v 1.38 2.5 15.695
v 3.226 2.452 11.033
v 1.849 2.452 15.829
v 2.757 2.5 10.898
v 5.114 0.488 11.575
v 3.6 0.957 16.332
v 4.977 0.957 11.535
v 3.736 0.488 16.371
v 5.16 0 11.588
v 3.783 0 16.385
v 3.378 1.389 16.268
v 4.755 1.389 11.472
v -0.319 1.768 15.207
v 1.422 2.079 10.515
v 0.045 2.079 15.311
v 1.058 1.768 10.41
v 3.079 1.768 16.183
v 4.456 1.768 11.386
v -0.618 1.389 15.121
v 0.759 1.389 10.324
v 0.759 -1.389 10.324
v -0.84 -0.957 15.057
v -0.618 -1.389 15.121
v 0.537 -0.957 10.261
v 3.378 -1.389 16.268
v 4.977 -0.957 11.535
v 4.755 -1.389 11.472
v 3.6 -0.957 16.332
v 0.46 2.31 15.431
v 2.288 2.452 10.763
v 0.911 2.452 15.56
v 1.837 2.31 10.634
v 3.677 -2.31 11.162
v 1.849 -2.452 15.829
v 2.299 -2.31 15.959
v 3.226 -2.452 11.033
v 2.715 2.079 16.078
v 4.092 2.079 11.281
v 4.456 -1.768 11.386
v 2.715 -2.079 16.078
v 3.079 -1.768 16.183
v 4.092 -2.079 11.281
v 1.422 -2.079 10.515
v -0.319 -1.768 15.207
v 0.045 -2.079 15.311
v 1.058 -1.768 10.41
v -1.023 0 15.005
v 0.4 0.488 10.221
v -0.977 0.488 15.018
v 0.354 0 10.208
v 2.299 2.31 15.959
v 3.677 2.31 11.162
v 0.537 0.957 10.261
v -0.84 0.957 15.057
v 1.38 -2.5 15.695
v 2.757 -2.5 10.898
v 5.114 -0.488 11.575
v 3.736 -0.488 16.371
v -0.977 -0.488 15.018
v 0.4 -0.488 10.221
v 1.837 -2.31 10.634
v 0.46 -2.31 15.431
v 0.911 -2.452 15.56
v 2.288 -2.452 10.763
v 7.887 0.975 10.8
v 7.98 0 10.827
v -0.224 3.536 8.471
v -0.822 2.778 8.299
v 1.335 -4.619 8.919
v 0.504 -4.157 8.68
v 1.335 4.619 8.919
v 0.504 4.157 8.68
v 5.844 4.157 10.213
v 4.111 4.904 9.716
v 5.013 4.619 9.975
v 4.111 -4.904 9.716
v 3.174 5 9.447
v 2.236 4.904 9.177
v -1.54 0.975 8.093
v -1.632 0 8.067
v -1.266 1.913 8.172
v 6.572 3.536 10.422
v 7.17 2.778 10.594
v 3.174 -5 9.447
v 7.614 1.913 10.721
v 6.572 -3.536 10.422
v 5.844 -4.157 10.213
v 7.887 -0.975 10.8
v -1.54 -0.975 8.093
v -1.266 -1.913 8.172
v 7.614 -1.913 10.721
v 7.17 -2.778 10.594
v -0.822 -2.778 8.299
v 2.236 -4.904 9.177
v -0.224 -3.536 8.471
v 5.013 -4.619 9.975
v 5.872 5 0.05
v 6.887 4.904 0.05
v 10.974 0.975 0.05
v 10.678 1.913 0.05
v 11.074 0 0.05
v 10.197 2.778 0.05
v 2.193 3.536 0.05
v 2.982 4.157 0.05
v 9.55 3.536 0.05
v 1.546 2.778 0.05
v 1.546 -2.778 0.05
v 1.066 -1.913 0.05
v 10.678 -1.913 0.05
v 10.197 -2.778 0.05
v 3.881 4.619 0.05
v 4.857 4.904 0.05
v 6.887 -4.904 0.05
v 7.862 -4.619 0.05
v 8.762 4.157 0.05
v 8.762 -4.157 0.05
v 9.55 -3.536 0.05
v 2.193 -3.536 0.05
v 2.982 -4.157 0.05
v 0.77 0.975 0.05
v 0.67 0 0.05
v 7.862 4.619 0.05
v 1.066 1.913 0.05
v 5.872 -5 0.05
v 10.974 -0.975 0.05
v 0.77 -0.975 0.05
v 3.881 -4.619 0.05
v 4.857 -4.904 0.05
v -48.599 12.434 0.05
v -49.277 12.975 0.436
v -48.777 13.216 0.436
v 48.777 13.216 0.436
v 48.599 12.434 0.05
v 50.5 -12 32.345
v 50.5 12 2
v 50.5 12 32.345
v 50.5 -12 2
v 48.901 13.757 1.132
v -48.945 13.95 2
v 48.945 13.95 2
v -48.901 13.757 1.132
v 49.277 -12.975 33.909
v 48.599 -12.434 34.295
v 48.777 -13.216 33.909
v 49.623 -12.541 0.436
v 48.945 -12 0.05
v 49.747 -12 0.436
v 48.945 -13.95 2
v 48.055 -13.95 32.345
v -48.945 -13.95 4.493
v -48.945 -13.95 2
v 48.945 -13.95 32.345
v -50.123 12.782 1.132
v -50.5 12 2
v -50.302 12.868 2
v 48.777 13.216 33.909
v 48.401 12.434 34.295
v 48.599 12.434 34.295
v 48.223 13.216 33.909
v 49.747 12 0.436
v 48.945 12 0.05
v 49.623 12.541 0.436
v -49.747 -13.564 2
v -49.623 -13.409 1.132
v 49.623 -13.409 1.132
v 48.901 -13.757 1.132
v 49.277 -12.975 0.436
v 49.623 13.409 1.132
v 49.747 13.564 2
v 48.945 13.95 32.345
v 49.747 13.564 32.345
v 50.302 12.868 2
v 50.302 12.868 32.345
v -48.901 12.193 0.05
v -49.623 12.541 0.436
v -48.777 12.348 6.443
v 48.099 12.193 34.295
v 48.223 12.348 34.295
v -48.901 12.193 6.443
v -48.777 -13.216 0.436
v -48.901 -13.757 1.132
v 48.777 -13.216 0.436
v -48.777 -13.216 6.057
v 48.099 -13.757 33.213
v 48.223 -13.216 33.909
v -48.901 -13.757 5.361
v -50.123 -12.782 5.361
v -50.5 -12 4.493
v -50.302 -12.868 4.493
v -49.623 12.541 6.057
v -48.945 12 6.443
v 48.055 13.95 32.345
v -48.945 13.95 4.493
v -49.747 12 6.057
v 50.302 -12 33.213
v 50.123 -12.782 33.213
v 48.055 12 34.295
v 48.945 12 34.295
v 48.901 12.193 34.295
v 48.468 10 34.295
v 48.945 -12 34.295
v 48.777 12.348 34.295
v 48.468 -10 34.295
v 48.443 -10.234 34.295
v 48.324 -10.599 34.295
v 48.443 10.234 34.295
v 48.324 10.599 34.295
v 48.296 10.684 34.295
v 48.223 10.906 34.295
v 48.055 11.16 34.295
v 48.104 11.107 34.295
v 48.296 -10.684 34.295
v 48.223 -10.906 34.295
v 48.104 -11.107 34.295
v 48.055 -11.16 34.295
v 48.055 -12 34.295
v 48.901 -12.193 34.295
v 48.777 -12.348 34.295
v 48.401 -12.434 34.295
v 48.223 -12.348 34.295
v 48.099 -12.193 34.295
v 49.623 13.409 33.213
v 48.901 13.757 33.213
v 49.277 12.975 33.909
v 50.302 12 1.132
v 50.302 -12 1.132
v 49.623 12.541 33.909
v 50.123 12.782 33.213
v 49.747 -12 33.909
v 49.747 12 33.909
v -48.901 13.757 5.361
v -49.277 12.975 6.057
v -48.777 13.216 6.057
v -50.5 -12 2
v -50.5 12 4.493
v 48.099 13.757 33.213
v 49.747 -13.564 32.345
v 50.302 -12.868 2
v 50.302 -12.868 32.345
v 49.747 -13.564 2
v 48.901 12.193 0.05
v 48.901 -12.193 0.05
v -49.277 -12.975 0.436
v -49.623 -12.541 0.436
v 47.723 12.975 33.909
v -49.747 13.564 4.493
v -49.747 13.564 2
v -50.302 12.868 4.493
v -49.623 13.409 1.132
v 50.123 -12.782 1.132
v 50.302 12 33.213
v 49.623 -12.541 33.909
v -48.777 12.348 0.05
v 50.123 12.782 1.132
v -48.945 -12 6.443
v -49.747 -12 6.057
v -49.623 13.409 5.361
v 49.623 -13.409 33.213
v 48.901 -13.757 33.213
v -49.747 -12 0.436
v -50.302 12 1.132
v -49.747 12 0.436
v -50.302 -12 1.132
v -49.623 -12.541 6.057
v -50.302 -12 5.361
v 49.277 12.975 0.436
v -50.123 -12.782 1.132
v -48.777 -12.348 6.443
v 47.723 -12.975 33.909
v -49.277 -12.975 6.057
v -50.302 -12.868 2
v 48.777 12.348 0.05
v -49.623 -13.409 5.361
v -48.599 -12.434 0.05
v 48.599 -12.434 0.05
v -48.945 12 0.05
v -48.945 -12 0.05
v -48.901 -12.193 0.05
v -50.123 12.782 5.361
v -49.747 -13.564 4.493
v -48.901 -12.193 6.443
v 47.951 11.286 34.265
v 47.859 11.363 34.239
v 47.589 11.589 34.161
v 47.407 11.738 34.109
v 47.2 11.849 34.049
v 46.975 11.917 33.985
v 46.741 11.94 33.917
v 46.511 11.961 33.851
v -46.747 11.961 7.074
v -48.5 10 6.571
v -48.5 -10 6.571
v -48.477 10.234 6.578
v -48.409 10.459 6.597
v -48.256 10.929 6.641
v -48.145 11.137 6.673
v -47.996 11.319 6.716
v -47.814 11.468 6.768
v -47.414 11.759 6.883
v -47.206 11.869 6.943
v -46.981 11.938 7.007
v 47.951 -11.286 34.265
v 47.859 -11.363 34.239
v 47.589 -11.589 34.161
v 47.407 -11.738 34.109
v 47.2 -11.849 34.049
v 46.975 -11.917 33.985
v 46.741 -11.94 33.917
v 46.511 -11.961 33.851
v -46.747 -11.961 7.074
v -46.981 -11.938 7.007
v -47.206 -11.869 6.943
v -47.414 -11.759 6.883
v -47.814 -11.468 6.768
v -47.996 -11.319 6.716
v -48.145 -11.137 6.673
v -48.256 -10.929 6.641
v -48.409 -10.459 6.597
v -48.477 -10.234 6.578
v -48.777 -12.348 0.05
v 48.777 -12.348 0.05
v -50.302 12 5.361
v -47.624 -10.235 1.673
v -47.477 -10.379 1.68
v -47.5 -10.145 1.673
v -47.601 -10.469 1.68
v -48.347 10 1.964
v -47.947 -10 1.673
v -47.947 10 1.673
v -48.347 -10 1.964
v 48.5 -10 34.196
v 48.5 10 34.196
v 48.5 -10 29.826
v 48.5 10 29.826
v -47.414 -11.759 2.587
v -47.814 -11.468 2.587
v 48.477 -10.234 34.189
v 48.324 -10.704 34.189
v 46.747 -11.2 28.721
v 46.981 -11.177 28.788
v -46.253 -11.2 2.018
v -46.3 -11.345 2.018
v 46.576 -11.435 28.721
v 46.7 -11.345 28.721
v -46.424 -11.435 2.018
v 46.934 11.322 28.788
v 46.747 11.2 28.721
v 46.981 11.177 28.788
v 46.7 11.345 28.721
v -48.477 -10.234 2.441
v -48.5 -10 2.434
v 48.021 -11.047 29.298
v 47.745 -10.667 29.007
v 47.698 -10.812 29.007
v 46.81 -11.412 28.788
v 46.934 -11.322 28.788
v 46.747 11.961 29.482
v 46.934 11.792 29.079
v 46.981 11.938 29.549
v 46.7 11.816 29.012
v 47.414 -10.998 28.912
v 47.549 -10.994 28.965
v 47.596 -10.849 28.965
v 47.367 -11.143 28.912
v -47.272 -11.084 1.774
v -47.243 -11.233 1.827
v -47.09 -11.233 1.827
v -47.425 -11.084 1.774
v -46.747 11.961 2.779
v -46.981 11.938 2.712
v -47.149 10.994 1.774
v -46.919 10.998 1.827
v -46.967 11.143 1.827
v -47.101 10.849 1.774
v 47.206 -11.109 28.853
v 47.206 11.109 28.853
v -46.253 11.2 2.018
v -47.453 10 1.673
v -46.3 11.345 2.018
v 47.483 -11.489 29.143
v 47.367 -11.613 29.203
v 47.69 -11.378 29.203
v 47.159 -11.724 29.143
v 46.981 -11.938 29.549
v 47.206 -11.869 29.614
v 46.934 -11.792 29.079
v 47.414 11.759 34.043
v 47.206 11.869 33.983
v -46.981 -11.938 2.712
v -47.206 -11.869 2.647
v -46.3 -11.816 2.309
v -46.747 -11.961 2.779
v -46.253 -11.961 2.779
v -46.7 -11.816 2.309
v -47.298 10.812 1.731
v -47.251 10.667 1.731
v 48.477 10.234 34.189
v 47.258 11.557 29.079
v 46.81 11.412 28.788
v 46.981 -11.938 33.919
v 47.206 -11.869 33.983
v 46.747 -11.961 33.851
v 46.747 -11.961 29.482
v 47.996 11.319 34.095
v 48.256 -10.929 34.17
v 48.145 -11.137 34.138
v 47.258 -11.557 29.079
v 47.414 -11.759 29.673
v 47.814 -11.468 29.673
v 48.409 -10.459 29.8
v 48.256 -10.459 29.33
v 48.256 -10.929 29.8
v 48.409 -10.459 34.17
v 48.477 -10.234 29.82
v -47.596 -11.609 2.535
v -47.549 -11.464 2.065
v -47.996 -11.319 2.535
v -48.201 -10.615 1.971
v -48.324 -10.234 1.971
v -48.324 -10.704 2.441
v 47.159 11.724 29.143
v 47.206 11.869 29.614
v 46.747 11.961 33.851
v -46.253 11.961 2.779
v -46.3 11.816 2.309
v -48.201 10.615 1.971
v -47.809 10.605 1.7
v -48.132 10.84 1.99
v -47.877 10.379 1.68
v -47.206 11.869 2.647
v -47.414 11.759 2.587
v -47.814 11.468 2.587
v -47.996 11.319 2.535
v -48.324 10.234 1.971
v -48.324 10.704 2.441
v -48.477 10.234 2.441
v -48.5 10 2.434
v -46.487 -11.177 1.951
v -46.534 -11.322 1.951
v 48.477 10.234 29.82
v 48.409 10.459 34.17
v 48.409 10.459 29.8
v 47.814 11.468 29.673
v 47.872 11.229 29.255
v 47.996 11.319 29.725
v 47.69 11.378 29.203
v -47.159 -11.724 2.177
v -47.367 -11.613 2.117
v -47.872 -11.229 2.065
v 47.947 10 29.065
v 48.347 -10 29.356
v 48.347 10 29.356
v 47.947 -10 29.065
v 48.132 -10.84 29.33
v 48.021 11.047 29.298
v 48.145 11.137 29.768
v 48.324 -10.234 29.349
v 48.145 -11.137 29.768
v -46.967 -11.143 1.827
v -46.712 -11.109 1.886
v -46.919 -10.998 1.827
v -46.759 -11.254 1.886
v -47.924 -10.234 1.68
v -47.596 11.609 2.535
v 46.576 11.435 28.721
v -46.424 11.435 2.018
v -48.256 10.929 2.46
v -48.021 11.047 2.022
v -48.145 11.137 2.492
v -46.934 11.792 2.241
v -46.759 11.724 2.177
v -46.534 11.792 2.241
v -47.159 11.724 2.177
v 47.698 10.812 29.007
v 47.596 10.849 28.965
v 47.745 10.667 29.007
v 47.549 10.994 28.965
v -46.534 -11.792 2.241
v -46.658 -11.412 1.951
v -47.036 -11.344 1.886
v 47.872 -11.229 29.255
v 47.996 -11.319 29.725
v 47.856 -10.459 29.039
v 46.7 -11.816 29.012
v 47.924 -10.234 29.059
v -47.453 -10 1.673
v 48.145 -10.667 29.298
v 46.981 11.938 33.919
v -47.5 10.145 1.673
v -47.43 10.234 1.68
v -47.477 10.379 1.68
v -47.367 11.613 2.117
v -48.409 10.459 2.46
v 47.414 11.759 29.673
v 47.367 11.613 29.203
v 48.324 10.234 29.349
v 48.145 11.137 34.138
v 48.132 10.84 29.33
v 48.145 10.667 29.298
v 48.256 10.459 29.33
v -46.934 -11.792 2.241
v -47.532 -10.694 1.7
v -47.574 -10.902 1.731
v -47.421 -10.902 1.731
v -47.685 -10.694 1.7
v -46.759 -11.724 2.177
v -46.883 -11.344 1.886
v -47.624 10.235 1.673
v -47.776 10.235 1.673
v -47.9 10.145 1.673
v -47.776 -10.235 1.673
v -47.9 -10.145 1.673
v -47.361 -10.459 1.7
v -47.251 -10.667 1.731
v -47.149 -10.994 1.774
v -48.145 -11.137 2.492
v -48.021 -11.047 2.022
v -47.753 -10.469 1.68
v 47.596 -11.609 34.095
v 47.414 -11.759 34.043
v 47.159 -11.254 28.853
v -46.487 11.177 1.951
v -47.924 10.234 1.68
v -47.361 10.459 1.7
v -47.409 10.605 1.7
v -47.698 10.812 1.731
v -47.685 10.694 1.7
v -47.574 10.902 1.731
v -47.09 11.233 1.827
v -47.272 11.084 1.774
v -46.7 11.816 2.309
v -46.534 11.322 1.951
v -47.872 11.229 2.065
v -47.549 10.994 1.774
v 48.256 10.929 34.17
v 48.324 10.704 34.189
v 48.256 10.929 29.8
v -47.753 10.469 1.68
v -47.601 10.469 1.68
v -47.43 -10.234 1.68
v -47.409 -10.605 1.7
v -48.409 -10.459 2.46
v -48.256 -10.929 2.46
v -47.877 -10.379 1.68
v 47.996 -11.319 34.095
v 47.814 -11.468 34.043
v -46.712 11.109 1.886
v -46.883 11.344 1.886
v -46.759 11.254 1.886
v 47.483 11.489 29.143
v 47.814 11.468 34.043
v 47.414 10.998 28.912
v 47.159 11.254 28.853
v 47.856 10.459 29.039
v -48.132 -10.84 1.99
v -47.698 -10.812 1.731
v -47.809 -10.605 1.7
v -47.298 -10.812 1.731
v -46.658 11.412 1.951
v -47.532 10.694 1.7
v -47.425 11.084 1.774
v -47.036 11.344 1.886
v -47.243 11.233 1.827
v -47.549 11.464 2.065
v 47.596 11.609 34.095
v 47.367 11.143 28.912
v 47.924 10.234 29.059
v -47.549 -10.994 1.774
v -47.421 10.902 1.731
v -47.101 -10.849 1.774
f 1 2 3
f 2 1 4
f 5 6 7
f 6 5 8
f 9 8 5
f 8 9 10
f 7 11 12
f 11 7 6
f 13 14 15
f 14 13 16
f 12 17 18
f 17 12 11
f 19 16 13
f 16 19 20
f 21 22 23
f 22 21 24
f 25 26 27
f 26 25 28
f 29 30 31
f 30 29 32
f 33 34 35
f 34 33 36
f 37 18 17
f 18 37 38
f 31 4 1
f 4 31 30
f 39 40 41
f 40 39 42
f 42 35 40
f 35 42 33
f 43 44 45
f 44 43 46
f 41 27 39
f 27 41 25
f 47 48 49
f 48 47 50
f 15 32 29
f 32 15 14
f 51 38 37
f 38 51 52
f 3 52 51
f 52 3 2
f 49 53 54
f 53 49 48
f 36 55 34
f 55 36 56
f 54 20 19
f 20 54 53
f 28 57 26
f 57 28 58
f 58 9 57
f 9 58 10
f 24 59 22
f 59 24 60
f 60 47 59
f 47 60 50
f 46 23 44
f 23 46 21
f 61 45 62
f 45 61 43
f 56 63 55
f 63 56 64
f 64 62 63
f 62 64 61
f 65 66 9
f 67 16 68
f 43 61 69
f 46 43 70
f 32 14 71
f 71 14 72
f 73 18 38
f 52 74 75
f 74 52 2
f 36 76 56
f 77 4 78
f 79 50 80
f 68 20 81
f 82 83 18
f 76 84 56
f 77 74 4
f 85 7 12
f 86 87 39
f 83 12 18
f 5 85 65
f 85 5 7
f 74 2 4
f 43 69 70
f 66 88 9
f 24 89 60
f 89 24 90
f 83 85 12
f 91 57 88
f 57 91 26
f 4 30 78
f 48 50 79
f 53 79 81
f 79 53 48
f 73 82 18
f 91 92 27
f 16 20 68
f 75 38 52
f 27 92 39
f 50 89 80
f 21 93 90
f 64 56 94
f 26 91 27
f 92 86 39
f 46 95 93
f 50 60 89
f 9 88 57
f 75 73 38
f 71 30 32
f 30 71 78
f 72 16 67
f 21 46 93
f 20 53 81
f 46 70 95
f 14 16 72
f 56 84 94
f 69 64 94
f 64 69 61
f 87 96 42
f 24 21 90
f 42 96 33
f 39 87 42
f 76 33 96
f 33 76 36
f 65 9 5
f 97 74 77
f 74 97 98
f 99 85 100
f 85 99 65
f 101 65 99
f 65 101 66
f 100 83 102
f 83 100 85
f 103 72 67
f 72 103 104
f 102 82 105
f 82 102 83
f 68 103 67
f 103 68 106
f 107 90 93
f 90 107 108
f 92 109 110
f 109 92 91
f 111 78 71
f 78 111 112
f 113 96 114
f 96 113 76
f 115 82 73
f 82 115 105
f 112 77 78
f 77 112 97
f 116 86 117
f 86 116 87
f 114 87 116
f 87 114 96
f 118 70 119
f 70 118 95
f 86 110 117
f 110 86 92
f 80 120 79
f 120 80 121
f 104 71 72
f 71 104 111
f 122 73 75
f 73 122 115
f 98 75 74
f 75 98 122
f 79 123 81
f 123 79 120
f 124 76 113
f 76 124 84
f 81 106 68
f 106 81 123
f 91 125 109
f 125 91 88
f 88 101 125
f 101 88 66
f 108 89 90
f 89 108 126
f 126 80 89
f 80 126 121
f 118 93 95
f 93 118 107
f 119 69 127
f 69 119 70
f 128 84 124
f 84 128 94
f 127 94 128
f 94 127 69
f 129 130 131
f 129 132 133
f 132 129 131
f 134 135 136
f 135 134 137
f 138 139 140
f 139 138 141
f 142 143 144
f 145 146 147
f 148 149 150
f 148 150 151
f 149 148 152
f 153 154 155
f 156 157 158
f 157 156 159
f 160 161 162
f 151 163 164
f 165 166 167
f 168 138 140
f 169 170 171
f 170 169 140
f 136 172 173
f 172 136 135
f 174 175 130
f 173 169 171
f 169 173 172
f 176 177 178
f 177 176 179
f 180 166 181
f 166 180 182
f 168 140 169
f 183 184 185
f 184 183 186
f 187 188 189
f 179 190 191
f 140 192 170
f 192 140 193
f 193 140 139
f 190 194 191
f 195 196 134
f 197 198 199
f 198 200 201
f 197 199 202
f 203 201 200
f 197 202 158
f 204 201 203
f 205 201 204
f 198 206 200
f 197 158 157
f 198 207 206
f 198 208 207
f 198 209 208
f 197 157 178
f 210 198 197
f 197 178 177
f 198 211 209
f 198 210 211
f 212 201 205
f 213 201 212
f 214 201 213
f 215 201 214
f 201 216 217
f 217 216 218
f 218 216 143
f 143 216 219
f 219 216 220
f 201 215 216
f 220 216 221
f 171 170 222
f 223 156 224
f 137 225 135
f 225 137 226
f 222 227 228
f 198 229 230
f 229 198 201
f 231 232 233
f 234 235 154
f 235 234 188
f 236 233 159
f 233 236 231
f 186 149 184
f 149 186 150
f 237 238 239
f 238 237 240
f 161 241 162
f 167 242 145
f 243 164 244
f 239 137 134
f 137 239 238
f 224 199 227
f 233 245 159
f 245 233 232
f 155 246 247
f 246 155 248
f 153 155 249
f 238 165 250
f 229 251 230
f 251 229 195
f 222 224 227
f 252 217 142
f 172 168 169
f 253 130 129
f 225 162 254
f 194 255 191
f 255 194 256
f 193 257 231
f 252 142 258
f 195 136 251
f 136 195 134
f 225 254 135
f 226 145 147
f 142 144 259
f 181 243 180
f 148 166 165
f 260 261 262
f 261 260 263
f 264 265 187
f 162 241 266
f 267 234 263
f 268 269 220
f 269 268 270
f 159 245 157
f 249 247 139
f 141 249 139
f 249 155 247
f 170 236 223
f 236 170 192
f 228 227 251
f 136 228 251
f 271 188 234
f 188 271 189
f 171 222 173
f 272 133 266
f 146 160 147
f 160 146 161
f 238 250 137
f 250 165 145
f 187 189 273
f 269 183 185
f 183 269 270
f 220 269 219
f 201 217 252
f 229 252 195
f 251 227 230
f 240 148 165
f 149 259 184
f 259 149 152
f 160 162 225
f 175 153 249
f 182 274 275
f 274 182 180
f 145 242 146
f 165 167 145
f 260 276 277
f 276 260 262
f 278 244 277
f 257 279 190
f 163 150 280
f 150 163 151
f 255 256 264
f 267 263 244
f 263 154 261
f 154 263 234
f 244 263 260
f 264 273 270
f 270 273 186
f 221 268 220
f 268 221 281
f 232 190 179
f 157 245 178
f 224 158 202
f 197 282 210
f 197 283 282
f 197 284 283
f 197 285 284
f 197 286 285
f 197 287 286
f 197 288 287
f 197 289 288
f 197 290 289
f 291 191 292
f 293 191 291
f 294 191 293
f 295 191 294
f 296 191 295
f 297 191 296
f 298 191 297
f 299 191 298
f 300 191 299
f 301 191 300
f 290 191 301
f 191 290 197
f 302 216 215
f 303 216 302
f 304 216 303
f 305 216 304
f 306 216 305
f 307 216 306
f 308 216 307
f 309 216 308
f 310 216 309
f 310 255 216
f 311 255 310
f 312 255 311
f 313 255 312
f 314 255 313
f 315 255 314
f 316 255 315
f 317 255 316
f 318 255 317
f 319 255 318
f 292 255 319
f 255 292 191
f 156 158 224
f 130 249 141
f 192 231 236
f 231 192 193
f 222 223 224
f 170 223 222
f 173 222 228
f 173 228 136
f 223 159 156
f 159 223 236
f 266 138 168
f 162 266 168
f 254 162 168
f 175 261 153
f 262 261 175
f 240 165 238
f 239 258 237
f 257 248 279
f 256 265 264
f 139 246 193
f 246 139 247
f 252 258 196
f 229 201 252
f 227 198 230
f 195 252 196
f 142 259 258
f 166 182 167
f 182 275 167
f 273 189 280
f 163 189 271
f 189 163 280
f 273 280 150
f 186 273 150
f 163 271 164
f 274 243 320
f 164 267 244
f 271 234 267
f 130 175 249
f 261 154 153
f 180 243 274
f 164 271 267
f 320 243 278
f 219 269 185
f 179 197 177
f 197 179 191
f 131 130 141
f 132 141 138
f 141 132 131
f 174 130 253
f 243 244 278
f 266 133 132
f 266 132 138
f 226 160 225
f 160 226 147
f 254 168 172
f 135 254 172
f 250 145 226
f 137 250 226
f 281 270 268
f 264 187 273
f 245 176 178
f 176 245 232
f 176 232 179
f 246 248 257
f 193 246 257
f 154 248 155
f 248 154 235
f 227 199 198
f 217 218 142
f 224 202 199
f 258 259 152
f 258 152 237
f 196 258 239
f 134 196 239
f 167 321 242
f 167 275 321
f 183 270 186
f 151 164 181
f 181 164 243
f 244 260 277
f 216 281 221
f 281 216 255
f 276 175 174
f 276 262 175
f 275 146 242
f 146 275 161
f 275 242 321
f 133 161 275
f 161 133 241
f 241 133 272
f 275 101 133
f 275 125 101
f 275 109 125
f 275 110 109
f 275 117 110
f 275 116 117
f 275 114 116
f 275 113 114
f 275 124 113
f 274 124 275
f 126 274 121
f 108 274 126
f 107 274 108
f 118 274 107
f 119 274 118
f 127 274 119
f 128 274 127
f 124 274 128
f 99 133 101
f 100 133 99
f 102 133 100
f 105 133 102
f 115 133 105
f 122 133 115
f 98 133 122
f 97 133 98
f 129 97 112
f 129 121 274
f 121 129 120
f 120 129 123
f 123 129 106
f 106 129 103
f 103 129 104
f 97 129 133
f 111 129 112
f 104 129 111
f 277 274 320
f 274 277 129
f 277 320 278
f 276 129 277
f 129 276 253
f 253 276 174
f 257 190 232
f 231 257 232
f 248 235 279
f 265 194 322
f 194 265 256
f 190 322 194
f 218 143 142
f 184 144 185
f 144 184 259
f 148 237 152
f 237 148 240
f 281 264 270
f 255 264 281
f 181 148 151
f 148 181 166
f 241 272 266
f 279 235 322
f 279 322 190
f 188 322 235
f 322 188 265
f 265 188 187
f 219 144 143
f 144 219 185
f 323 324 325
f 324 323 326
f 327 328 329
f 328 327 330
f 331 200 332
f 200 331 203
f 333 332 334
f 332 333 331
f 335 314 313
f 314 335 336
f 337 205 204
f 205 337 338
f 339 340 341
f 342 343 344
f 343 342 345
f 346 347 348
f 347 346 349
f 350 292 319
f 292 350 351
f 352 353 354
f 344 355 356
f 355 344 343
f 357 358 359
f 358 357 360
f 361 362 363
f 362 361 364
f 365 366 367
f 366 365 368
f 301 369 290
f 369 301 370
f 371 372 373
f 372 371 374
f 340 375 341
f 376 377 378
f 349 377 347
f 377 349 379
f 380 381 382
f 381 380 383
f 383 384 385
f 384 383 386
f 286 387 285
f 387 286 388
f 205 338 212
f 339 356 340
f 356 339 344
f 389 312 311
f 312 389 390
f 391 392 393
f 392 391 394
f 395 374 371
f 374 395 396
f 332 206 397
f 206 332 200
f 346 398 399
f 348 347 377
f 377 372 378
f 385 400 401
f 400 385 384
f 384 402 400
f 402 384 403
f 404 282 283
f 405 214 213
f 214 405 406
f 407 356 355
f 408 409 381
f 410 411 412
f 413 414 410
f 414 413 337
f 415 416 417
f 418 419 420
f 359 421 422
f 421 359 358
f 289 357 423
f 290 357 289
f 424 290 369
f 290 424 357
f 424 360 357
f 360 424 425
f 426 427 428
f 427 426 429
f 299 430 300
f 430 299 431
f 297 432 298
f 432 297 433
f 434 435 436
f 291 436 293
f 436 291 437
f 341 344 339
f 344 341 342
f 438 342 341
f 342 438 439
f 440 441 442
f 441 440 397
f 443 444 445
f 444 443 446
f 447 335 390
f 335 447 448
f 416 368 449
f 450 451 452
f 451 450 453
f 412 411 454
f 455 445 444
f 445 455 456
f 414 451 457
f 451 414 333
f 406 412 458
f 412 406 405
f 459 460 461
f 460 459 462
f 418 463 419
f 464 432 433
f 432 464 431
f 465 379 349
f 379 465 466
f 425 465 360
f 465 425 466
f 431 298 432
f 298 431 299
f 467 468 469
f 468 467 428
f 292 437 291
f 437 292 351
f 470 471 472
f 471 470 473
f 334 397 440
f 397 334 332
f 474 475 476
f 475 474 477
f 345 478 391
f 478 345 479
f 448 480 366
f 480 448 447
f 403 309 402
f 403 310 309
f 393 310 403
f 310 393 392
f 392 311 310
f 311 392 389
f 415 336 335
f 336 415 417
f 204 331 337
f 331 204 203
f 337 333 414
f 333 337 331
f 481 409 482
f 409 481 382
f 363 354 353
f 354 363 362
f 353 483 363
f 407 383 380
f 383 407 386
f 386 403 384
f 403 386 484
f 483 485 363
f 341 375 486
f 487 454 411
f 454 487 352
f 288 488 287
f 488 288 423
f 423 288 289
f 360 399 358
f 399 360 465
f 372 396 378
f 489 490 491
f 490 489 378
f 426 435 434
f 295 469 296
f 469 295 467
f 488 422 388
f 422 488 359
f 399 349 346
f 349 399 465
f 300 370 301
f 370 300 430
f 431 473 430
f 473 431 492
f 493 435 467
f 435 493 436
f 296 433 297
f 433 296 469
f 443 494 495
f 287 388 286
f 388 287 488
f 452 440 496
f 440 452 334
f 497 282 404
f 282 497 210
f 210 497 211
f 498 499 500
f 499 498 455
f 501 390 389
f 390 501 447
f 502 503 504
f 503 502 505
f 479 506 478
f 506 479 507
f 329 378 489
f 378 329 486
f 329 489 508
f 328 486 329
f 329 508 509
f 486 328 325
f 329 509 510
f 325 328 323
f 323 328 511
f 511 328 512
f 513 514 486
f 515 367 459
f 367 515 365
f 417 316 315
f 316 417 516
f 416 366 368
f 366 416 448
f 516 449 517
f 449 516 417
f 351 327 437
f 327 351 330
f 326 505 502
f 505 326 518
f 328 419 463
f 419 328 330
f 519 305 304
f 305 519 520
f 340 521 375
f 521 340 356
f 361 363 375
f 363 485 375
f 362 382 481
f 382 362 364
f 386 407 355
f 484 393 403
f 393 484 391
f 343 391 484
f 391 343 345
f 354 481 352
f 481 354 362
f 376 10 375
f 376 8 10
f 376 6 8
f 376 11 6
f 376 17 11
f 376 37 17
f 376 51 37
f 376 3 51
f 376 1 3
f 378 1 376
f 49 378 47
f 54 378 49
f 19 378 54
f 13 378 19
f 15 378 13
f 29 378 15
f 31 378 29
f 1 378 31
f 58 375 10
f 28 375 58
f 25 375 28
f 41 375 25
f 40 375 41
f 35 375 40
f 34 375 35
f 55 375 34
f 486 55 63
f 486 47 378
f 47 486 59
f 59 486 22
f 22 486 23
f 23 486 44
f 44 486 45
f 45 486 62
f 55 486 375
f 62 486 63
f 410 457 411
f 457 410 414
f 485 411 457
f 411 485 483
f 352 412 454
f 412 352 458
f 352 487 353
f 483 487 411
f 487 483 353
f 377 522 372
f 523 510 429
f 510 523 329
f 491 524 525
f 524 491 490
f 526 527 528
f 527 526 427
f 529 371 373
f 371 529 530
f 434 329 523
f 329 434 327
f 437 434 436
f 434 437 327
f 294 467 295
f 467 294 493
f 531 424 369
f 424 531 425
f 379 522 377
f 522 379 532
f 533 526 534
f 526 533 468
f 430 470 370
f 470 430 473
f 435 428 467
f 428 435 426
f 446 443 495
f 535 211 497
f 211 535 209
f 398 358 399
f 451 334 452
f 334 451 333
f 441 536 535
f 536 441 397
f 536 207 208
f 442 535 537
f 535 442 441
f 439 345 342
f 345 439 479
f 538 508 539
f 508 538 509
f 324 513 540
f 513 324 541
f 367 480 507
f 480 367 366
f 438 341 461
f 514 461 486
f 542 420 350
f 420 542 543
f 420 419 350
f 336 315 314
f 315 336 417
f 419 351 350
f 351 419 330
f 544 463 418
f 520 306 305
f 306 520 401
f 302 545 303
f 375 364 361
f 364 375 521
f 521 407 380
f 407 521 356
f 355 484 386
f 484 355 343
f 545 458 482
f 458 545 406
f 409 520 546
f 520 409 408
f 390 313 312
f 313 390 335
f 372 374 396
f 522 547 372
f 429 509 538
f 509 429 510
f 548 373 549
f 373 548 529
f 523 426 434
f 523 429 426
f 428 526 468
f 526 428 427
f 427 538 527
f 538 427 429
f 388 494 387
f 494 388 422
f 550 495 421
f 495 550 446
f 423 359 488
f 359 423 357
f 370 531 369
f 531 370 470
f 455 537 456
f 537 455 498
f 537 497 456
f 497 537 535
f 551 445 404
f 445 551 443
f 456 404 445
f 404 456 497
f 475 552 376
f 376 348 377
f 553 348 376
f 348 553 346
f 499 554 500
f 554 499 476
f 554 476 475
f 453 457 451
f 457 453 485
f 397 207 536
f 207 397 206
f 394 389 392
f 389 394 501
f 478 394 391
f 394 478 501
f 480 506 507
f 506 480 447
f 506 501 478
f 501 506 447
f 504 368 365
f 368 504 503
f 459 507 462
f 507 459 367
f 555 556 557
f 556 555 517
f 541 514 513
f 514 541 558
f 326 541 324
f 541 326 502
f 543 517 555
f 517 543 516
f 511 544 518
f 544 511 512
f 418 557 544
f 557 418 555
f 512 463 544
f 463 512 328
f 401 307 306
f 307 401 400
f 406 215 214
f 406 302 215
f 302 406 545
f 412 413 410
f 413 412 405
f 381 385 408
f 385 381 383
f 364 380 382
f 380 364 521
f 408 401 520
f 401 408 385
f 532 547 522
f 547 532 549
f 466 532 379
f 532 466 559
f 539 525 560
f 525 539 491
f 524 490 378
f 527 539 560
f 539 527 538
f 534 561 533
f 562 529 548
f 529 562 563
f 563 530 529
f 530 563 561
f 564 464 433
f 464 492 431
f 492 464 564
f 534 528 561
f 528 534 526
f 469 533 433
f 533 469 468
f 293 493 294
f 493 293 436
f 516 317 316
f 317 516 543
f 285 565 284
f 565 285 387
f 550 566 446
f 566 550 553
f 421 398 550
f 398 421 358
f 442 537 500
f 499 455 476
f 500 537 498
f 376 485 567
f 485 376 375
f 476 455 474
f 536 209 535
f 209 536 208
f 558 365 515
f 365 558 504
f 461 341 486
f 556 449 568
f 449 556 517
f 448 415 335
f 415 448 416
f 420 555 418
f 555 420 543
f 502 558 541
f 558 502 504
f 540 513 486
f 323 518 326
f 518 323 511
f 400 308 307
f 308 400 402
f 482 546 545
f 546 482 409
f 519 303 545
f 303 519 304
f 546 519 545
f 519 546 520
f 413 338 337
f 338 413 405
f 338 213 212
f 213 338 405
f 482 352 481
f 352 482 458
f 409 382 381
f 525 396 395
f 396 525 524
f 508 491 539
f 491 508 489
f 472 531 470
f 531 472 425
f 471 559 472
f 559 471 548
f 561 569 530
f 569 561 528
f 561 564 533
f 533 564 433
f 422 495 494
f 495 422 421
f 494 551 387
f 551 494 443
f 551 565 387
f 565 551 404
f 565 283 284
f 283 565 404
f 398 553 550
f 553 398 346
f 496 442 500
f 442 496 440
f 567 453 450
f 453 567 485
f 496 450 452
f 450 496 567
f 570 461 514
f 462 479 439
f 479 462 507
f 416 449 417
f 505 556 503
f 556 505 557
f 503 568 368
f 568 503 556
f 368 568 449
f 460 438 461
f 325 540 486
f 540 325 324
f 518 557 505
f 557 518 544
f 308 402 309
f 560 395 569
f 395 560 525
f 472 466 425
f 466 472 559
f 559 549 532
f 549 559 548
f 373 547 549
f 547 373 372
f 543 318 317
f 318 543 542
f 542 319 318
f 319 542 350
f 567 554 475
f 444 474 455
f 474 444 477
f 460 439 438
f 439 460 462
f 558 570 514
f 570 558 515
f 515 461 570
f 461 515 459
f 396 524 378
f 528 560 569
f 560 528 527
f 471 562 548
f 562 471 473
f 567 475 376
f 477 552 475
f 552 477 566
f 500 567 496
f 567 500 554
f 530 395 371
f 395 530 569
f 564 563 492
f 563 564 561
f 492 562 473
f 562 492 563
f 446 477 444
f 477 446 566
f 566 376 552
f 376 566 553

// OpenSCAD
// =====================================================================
//  PIED BABY-FOOT MONNERET — Patin / Sabot de pied
//  Geometrie validee sur la PIECE REELLE (photos src/) :
//   - corps PLEIN, aretes exterieures arrondies (R2)
//   - CREUX de 5 mm dans le TOIT INCLINE, ⊥ a la face, borde de 2 mm
//   - collerette pleine de 3 mm autour du trou (au niveau du toit)
//   - trou Ø5 (moitie haute) + CONTRE-PERCAGE par le dessous :
//       Ø plus grand, profondeur = moitie de la piece, fond plat,
//       entree legerement conique. La vis entre par le dessous.
//  Repere : longueur = X, largeur = Y, hauteur = Z, dessous a Z = 0.
//
//  Export STL : F6 (rendu) puis "Export as STL".
// =====================================================================

/* [Dimensions principales (cotees)] */
L       = 101;
W       = 28;
H_thick = 35;
H_thin  = 6;
hole_d  = 5;       // perçage de la vis (moitie haute)

/* [Creux du toit incline] */
border       = 2;    // bordure tout autour du creux
recess_depth = 5;    // profondeur du creux (perpendiculaire a la face)
lip          = 0.8;  // leger arrondi/adouci de la levre (bordure) du creux

/* [Percage] */
o5_depth = 10;     // Ø5 sur 1 cm depuis le toit, puis Ø10 jusqu'au bout
cb_d     = 10;     // diametre de la partie basse (logement tete de vis)
cb_cham  = 1.5;    // epaulement leger (chanfrein) a la jonction Ø5/Ø10

/* [Arrondis] */
cong       = 2;    // arrondi des aretes exterieures (R2)
fillet_int = 2;    // conges interieurs (R2) du creux

$fn = 32;
eps = 0.01;
slope    = atan((H_thick - H_thin) / L);
face_len = L / cos(slope);
z_center = (H_thin + H_thick) / 2;
axis_len = z_center / cos(slope);   // longueur de l'axe du trou (toit -> dessous)

module rrect(x, y, r) {
    hull() for (i = [-1, 1], j = [-1, 1])
        translate([i * (x/2 - r), j * (y/2 - r)]) circle(r = r);
}
module wedge_core() {
    rotate([90, 0, 0]) linear_extrude(height = W - 2*cong, center = true)
        offset(-cong) polygon([[-L/2, 0], [L/2, 0], [L/2, H_thick], [-L/2, H_thin]]);
}
// coin plein (taille reelle) — utilise pour le calcul du creux
module wedge_full() {
    rotate([90, 0, 0]) linear_extrude(height = W, center = true)
        polygon([[-L/2, 0], [L/2, 0], [L/2, H_thick], [-L/2, H_thin]]);
}
module body() { minkowski() { wedge_core(); sphere(r = cong, $fn = 14); } }

// repere aligne sur la face inclinee : Z local = normale ; surface a z_local = cong
module on_face() { translate([0, 0, z_center]) rotate([0, -slope, 0]) children(); }

// couche de profondeur d sous le toit (mesuree PERPENDICULAIREMENT au toit)
module top_layer(d) {
    difference() {
        wedge_full();
        translate([d*sin(slope), 0, -d*cos(slope)]) wedge_full();
    }
}
// creux : parois VERTICALES (alignees sur le plan du bas), fond parallele au toit,
// profondeur 5 mm perpendiculaire ; levre legerement arrondie (lip)
module recess() {
    minkowski() {
        intersection() {
            translate([0, 0, -1]) linear_extrude(H_thick + 12)
                rrect(L - 2*border - 2*lip, W - 2*border - 2*lip, max(fillet_int - lip, 0.6));
            top_layer(recess_depth - lip);
        }
        sphere(r = lip, $fn = 10);
    }
}
// percage : Ø5 sur 1 cm (depuis le toit) -> epaulement leger -> Ø10 jusqu'au bout
module fixing_hole() {
    on_face() {
        translate([0, 0, -o5_depth])          cylinder(h = o5_depth + 6, d = hole_d);                    // Ø5 (toit -> 10 mm)
        translate([0, 0, -o5_depth - cb_cham]) cylinder(h = cb_cham + eps, d1 = cb_d, d2 = hole_d);       // epaulement leger (chanfrein)
        translate([0, 0, -axis_len - 8])       cylinder(h = axis_len + 8 - o5_depth - cb_cham, d = cb_d); // Ø10 jusqu'au bout (deborde -> traverse)
    }
}

// ===================== assemblage =====================
difference() {
    body();
    recess();
    fixing_hole();
}
